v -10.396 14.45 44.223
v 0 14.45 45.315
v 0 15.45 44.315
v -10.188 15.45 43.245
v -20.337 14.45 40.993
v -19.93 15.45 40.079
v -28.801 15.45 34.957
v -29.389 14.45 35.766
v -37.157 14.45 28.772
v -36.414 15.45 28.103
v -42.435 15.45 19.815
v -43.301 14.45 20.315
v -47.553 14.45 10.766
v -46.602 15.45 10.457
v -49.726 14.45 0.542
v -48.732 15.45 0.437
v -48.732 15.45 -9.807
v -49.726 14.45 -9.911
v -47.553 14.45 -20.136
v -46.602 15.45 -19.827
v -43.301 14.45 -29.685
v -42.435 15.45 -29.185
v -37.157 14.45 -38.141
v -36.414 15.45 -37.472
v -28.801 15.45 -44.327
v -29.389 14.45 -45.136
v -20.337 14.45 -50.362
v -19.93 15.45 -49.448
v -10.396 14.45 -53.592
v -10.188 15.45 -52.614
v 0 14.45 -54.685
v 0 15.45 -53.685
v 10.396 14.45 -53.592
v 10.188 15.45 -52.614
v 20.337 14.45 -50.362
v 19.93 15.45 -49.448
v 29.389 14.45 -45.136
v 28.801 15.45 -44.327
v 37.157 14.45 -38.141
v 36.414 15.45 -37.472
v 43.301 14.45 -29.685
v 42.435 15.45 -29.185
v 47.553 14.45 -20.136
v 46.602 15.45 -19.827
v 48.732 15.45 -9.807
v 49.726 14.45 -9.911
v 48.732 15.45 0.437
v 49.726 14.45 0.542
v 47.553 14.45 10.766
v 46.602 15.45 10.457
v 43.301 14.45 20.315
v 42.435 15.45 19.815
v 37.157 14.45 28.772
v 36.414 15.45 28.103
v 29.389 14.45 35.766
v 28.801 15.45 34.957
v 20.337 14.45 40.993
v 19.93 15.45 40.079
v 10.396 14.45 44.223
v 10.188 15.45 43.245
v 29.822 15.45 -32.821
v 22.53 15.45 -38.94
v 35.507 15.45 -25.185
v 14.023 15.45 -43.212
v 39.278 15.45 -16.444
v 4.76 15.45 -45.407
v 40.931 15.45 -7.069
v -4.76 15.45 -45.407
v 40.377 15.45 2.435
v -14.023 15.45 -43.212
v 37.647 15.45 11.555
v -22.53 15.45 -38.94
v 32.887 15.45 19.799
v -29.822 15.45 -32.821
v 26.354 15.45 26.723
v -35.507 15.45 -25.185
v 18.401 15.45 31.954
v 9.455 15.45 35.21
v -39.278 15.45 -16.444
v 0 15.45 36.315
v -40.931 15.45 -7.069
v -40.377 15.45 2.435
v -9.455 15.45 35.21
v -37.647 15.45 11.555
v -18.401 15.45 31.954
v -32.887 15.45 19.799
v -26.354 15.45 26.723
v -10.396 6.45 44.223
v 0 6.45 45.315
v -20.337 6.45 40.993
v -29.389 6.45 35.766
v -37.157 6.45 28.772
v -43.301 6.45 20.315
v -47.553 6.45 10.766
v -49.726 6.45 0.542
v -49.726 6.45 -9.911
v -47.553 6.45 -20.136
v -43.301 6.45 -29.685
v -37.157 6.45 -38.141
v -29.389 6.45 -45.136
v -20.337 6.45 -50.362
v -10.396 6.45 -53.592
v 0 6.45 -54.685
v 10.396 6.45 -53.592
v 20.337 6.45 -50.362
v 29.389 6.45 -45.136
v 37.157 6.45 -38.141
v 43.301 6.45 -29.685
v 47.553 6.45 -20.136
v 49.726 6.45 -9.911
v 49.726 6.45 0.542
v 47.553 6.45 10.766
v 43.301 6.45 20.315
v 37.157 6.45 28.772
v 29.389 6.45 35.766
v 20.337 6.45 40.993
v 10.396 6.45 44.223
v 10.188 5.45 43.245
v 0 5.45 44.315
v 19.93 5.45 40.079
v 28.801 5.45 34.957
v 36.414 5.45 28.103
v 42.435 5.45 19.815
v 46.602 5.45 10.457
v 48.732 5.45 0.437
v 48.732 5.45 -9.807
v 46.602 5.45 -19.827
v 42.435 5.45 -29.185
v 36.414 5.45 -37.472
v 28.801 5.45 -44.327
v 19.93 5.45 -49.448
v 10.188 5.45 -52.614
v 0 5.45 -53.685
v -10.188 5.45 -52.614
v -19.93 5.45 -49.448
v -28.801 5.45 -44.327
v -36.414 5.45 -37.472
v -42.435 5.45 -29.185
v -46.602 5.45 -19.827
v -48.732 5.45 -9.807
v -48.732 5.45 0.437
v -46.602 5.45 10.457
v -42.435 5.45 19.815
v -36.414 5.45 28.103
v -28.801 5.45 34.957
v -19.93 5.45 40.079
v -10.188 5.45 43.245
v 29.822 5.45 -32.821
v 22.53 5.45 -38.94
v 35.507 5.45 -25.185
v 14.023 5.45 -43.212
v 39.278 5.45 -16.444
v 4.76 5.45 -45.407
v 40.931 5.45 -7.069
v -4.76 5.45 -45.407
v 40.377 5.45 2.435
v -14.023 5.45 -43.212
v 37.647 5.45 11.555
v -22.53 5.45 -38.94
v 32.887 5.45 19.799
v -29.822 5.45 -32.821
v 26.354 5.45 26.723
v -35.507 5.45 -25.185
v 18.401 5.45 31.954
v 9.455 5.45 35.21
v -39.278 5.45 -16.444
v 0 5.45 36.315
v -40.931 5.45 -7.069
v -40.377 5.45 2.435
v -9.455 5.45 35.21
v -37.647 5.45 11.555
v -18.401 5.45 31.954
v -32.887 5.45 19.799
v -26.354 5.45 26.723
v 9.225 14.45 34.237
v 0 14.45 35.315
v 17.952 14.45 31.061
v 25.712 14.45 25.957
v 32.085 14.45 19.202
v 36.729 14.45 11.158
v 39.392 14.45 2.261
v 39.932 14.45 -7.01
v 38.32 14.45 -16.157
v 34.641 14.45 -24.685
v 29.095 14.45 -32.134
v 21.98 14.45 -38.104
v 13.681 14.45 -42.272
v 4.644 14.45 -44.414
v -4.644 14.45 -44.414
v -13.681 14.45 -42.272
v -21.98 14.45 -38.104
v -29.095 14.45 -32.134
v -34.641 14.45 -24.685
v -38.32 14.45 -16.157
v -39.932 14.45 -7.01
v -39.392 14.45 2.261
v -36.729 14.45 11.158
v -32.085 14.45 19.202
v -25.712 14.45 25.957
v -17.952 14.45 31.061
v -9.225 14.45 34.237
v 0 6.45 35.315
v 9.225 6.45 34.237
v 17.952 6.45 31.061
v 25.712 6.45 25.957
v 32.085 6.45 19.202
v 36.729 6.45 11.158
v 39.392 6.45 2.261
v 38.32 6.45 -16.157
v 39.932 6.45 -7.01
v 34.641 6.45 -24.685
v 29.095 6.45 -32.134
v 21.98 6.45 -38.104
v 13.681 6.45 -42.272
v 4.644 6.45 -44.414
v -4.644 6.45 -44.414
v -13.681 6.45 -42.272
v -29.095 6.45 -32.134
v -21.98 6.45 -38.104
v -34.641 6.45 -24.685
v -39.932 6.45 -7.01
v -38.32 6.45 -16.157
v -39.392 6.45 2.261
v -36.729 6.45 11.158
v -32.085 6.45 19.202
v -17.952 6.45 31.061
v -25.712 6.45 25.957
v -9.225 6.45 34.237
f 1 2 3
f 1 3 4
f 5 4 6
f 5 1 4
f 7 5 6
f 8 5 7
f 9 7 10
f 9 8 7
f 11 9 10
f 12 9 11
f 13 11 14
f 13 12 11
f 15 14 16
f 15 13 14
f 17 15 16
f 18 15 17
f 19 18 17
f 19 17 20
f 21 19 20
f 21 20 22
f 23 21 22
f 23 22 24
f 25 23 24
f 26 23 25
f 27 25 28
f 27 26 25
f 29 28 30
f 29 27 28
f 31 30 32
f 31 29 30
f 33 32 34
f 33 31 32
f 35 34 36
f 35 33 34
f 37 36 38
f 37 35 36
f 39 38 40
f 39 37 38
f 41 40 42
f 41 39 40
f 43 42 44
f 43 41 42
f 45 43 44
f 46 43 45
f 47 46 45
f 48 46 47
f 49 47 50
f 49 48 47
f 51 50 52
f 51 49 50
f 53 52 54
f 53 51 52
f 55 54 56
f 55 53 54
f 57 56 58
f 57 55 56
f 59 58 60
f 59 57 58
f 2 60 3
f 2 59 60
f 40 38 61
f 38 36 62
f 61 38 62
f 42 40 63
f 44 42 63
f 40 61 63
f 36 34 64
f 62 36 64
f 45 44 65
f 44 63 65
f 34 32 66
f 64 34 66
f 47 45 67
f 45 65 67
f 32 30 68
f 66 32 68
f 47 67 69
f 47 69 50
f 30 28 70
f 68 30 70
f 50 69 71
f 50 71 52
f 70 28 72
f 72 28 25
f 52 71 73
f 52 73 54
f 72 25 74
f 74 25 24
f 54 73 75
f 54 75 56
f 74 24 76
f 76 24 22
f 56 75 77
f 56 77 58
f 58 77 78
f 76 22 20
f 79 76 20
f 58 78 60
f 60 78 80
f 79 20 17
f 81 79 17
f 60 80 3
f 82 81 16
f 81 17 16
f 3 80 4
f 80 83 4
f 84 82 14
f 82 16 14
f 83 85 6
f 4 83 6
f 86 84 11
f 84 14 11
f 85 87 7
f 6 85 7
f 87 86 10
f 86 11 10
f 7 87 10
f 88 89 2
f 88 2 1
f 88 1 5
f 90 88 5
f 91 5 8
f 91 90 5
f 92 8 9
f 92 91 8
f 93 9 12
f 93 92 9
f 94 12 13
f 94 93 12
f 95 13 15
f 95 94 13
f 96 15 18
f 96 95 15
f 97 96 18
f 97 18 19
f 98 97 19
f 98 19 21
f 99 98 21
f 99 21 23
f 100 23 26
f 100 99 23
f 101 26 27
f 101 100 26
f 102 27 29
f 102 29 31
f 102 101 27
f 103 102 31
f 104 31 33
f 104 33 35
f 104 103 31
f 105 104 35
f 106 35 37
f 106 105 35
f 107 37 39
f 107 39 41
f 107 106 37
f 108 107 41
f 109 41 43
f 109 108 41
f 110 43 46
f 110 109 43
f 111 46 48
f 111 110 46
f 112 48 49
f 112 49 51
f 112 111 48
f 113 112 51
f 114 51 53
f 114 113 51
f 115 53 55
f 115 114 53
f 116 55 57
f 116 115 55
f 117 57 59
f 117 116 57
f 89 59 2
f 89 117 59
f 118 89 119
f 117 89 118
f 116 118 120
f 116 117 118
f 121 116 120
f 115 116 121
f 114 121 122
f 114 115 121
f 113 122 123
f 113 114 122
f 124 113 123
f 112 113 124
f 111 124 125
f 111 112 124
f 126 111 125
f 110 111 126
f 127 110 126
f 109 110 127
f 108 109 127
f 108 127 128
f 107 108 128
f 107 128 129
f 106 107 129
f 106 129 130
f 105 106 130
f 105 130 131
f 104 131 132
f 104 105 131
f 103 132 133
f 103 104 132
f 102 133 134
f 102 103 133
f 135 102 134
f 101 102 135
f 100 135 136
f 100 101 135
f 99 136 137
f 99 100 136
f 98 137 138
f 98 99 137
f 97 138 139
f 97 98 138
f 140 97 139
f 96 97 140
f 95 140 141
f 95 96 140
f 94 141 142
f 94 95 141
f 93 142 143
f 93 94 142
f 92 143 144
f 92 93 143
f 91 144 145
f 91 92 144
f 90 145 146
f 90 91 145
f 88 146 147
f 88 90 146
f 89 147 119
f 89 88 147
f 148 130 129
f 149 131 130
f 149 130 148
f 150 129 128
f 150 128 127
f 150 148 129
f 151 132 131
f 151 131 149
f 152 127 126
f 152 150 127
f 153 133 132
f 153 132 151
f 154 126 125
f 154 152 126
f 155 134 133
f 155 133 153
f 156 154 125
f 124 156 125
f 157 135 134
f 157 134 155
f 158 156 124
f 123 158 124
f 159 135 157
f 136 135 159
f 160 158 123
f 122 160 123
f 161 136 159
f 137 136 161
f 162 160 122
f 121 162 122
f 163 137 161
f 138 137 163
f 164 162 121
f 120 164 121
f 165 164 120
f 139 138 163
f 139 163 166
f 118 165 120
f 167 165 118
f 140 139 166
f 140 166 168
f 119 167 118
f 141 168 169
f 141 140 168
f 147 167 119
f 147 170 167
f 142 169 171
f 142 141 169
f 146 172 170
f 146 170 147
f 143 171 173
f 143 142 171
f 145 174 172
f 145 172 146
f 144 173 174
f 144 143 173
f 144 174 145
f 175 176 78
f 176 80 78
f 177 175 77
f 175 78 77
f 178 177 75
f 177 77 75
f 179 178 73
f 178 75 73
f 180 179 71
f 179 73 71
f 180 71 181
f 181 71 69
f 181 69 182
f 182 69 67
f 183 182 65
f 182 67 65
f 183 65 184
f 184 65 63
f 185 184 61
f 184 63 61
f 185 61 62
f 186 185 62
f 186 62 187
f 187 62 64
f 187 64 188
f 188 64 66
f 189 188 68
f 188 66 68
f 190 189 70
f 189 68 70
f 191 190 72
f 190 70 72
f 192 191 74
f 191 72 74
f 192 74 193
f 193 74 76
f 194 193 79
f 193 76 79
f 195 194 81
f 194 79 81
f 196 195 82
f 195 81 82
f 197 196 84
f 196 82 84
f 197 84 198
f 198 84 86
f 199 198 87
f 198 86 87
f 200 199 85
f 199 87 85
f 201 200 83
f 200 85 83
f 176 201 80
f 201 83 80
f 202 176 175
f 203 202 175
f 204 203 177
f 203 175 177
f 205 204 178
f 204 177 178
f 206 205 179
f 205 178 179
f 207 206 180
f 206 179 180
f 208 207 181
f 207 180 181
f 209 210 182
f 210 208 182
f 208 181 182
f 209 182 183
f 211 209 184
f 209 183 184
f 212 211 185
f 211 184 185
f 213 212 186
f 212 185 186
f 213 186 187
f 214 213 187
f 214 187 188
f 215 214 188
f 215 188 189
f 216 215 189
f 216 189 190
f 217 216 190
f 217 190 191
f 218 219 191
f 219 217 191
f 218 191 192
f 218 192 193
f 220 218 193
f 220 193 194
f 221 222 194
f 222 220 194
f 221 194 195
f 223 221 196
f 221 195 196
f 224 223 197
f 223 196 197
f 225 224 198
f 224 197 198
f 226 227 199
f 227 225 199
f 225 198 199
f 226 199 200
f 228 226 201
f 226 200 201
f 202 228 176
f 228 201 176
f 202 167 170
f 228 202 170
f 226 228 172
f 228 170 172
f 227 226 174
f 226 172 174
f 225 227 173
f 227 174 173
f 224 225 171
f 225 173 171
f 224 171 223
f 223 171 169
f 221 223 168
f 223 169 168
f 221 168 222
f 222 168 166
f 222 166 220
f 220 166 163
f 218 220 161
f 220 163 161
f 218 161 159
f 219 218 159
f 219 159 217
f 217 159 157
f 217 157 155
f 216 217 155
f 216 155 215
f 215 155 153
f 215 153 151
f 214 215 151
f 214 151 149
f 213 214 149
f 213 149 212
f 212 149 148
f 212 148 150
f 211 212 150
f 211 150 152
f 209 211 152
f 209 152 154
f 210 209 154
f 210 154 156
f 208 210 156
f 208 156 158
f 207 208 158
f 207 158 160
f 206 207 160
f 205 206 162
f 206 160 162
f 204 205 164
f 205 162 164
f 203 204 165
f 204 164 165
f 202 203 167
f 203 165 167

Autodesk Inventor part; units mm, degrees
ref_plane "YZ Plane" through (0, 0, 0) normal (1, 0, 0) x (0, 1, 0)
ref_plane "XZ Plane" through (0, 0, 0) normal (0, 1, 0) x (-1, 0, 0)
ref_plane "XY Plane" through (0, 0, 0) normal (0, 0, 1) x (1, 0, 0)
sketch "Sketch1" plane through (0, 0, 0) normal (1, 0, 0) x (0, 1, 0)
  line L0 (15.4505, 45.3153) -> (5.4505, 45.3153)
  line L1 (5.4505, 45.3153) -> (5.4505, 35.3153)
  line L2 (5.4505, 35.3153) -> (15.4505, 35.3153)
  line L3 (15.4505, 35.3153) -> (15.4505, 45.3153)
  line L4 (29.1713, -4.6847) -> (-18.7008, -4.6847)
  point P0 (0, 0)
  dimension "d0" = 10
  dimension "d1" = 10
  dimension "d3" = 100
revolve "Revolution1" add sketch "Sketch1" angle 360 about axis through (0, 29.1713, -4.6847) along (0, -1, 0)
chamfer "Chamfer1" distance 1 angle 45 4 edges at (0, 15.4505, -54.6847) (0, 5.4505, -54.6847) (0, 15.4505, -44.6847) (0, 5.4505, -44.6847)
properties part number "bearing100-80-10" material "Steel, Galvanized"
